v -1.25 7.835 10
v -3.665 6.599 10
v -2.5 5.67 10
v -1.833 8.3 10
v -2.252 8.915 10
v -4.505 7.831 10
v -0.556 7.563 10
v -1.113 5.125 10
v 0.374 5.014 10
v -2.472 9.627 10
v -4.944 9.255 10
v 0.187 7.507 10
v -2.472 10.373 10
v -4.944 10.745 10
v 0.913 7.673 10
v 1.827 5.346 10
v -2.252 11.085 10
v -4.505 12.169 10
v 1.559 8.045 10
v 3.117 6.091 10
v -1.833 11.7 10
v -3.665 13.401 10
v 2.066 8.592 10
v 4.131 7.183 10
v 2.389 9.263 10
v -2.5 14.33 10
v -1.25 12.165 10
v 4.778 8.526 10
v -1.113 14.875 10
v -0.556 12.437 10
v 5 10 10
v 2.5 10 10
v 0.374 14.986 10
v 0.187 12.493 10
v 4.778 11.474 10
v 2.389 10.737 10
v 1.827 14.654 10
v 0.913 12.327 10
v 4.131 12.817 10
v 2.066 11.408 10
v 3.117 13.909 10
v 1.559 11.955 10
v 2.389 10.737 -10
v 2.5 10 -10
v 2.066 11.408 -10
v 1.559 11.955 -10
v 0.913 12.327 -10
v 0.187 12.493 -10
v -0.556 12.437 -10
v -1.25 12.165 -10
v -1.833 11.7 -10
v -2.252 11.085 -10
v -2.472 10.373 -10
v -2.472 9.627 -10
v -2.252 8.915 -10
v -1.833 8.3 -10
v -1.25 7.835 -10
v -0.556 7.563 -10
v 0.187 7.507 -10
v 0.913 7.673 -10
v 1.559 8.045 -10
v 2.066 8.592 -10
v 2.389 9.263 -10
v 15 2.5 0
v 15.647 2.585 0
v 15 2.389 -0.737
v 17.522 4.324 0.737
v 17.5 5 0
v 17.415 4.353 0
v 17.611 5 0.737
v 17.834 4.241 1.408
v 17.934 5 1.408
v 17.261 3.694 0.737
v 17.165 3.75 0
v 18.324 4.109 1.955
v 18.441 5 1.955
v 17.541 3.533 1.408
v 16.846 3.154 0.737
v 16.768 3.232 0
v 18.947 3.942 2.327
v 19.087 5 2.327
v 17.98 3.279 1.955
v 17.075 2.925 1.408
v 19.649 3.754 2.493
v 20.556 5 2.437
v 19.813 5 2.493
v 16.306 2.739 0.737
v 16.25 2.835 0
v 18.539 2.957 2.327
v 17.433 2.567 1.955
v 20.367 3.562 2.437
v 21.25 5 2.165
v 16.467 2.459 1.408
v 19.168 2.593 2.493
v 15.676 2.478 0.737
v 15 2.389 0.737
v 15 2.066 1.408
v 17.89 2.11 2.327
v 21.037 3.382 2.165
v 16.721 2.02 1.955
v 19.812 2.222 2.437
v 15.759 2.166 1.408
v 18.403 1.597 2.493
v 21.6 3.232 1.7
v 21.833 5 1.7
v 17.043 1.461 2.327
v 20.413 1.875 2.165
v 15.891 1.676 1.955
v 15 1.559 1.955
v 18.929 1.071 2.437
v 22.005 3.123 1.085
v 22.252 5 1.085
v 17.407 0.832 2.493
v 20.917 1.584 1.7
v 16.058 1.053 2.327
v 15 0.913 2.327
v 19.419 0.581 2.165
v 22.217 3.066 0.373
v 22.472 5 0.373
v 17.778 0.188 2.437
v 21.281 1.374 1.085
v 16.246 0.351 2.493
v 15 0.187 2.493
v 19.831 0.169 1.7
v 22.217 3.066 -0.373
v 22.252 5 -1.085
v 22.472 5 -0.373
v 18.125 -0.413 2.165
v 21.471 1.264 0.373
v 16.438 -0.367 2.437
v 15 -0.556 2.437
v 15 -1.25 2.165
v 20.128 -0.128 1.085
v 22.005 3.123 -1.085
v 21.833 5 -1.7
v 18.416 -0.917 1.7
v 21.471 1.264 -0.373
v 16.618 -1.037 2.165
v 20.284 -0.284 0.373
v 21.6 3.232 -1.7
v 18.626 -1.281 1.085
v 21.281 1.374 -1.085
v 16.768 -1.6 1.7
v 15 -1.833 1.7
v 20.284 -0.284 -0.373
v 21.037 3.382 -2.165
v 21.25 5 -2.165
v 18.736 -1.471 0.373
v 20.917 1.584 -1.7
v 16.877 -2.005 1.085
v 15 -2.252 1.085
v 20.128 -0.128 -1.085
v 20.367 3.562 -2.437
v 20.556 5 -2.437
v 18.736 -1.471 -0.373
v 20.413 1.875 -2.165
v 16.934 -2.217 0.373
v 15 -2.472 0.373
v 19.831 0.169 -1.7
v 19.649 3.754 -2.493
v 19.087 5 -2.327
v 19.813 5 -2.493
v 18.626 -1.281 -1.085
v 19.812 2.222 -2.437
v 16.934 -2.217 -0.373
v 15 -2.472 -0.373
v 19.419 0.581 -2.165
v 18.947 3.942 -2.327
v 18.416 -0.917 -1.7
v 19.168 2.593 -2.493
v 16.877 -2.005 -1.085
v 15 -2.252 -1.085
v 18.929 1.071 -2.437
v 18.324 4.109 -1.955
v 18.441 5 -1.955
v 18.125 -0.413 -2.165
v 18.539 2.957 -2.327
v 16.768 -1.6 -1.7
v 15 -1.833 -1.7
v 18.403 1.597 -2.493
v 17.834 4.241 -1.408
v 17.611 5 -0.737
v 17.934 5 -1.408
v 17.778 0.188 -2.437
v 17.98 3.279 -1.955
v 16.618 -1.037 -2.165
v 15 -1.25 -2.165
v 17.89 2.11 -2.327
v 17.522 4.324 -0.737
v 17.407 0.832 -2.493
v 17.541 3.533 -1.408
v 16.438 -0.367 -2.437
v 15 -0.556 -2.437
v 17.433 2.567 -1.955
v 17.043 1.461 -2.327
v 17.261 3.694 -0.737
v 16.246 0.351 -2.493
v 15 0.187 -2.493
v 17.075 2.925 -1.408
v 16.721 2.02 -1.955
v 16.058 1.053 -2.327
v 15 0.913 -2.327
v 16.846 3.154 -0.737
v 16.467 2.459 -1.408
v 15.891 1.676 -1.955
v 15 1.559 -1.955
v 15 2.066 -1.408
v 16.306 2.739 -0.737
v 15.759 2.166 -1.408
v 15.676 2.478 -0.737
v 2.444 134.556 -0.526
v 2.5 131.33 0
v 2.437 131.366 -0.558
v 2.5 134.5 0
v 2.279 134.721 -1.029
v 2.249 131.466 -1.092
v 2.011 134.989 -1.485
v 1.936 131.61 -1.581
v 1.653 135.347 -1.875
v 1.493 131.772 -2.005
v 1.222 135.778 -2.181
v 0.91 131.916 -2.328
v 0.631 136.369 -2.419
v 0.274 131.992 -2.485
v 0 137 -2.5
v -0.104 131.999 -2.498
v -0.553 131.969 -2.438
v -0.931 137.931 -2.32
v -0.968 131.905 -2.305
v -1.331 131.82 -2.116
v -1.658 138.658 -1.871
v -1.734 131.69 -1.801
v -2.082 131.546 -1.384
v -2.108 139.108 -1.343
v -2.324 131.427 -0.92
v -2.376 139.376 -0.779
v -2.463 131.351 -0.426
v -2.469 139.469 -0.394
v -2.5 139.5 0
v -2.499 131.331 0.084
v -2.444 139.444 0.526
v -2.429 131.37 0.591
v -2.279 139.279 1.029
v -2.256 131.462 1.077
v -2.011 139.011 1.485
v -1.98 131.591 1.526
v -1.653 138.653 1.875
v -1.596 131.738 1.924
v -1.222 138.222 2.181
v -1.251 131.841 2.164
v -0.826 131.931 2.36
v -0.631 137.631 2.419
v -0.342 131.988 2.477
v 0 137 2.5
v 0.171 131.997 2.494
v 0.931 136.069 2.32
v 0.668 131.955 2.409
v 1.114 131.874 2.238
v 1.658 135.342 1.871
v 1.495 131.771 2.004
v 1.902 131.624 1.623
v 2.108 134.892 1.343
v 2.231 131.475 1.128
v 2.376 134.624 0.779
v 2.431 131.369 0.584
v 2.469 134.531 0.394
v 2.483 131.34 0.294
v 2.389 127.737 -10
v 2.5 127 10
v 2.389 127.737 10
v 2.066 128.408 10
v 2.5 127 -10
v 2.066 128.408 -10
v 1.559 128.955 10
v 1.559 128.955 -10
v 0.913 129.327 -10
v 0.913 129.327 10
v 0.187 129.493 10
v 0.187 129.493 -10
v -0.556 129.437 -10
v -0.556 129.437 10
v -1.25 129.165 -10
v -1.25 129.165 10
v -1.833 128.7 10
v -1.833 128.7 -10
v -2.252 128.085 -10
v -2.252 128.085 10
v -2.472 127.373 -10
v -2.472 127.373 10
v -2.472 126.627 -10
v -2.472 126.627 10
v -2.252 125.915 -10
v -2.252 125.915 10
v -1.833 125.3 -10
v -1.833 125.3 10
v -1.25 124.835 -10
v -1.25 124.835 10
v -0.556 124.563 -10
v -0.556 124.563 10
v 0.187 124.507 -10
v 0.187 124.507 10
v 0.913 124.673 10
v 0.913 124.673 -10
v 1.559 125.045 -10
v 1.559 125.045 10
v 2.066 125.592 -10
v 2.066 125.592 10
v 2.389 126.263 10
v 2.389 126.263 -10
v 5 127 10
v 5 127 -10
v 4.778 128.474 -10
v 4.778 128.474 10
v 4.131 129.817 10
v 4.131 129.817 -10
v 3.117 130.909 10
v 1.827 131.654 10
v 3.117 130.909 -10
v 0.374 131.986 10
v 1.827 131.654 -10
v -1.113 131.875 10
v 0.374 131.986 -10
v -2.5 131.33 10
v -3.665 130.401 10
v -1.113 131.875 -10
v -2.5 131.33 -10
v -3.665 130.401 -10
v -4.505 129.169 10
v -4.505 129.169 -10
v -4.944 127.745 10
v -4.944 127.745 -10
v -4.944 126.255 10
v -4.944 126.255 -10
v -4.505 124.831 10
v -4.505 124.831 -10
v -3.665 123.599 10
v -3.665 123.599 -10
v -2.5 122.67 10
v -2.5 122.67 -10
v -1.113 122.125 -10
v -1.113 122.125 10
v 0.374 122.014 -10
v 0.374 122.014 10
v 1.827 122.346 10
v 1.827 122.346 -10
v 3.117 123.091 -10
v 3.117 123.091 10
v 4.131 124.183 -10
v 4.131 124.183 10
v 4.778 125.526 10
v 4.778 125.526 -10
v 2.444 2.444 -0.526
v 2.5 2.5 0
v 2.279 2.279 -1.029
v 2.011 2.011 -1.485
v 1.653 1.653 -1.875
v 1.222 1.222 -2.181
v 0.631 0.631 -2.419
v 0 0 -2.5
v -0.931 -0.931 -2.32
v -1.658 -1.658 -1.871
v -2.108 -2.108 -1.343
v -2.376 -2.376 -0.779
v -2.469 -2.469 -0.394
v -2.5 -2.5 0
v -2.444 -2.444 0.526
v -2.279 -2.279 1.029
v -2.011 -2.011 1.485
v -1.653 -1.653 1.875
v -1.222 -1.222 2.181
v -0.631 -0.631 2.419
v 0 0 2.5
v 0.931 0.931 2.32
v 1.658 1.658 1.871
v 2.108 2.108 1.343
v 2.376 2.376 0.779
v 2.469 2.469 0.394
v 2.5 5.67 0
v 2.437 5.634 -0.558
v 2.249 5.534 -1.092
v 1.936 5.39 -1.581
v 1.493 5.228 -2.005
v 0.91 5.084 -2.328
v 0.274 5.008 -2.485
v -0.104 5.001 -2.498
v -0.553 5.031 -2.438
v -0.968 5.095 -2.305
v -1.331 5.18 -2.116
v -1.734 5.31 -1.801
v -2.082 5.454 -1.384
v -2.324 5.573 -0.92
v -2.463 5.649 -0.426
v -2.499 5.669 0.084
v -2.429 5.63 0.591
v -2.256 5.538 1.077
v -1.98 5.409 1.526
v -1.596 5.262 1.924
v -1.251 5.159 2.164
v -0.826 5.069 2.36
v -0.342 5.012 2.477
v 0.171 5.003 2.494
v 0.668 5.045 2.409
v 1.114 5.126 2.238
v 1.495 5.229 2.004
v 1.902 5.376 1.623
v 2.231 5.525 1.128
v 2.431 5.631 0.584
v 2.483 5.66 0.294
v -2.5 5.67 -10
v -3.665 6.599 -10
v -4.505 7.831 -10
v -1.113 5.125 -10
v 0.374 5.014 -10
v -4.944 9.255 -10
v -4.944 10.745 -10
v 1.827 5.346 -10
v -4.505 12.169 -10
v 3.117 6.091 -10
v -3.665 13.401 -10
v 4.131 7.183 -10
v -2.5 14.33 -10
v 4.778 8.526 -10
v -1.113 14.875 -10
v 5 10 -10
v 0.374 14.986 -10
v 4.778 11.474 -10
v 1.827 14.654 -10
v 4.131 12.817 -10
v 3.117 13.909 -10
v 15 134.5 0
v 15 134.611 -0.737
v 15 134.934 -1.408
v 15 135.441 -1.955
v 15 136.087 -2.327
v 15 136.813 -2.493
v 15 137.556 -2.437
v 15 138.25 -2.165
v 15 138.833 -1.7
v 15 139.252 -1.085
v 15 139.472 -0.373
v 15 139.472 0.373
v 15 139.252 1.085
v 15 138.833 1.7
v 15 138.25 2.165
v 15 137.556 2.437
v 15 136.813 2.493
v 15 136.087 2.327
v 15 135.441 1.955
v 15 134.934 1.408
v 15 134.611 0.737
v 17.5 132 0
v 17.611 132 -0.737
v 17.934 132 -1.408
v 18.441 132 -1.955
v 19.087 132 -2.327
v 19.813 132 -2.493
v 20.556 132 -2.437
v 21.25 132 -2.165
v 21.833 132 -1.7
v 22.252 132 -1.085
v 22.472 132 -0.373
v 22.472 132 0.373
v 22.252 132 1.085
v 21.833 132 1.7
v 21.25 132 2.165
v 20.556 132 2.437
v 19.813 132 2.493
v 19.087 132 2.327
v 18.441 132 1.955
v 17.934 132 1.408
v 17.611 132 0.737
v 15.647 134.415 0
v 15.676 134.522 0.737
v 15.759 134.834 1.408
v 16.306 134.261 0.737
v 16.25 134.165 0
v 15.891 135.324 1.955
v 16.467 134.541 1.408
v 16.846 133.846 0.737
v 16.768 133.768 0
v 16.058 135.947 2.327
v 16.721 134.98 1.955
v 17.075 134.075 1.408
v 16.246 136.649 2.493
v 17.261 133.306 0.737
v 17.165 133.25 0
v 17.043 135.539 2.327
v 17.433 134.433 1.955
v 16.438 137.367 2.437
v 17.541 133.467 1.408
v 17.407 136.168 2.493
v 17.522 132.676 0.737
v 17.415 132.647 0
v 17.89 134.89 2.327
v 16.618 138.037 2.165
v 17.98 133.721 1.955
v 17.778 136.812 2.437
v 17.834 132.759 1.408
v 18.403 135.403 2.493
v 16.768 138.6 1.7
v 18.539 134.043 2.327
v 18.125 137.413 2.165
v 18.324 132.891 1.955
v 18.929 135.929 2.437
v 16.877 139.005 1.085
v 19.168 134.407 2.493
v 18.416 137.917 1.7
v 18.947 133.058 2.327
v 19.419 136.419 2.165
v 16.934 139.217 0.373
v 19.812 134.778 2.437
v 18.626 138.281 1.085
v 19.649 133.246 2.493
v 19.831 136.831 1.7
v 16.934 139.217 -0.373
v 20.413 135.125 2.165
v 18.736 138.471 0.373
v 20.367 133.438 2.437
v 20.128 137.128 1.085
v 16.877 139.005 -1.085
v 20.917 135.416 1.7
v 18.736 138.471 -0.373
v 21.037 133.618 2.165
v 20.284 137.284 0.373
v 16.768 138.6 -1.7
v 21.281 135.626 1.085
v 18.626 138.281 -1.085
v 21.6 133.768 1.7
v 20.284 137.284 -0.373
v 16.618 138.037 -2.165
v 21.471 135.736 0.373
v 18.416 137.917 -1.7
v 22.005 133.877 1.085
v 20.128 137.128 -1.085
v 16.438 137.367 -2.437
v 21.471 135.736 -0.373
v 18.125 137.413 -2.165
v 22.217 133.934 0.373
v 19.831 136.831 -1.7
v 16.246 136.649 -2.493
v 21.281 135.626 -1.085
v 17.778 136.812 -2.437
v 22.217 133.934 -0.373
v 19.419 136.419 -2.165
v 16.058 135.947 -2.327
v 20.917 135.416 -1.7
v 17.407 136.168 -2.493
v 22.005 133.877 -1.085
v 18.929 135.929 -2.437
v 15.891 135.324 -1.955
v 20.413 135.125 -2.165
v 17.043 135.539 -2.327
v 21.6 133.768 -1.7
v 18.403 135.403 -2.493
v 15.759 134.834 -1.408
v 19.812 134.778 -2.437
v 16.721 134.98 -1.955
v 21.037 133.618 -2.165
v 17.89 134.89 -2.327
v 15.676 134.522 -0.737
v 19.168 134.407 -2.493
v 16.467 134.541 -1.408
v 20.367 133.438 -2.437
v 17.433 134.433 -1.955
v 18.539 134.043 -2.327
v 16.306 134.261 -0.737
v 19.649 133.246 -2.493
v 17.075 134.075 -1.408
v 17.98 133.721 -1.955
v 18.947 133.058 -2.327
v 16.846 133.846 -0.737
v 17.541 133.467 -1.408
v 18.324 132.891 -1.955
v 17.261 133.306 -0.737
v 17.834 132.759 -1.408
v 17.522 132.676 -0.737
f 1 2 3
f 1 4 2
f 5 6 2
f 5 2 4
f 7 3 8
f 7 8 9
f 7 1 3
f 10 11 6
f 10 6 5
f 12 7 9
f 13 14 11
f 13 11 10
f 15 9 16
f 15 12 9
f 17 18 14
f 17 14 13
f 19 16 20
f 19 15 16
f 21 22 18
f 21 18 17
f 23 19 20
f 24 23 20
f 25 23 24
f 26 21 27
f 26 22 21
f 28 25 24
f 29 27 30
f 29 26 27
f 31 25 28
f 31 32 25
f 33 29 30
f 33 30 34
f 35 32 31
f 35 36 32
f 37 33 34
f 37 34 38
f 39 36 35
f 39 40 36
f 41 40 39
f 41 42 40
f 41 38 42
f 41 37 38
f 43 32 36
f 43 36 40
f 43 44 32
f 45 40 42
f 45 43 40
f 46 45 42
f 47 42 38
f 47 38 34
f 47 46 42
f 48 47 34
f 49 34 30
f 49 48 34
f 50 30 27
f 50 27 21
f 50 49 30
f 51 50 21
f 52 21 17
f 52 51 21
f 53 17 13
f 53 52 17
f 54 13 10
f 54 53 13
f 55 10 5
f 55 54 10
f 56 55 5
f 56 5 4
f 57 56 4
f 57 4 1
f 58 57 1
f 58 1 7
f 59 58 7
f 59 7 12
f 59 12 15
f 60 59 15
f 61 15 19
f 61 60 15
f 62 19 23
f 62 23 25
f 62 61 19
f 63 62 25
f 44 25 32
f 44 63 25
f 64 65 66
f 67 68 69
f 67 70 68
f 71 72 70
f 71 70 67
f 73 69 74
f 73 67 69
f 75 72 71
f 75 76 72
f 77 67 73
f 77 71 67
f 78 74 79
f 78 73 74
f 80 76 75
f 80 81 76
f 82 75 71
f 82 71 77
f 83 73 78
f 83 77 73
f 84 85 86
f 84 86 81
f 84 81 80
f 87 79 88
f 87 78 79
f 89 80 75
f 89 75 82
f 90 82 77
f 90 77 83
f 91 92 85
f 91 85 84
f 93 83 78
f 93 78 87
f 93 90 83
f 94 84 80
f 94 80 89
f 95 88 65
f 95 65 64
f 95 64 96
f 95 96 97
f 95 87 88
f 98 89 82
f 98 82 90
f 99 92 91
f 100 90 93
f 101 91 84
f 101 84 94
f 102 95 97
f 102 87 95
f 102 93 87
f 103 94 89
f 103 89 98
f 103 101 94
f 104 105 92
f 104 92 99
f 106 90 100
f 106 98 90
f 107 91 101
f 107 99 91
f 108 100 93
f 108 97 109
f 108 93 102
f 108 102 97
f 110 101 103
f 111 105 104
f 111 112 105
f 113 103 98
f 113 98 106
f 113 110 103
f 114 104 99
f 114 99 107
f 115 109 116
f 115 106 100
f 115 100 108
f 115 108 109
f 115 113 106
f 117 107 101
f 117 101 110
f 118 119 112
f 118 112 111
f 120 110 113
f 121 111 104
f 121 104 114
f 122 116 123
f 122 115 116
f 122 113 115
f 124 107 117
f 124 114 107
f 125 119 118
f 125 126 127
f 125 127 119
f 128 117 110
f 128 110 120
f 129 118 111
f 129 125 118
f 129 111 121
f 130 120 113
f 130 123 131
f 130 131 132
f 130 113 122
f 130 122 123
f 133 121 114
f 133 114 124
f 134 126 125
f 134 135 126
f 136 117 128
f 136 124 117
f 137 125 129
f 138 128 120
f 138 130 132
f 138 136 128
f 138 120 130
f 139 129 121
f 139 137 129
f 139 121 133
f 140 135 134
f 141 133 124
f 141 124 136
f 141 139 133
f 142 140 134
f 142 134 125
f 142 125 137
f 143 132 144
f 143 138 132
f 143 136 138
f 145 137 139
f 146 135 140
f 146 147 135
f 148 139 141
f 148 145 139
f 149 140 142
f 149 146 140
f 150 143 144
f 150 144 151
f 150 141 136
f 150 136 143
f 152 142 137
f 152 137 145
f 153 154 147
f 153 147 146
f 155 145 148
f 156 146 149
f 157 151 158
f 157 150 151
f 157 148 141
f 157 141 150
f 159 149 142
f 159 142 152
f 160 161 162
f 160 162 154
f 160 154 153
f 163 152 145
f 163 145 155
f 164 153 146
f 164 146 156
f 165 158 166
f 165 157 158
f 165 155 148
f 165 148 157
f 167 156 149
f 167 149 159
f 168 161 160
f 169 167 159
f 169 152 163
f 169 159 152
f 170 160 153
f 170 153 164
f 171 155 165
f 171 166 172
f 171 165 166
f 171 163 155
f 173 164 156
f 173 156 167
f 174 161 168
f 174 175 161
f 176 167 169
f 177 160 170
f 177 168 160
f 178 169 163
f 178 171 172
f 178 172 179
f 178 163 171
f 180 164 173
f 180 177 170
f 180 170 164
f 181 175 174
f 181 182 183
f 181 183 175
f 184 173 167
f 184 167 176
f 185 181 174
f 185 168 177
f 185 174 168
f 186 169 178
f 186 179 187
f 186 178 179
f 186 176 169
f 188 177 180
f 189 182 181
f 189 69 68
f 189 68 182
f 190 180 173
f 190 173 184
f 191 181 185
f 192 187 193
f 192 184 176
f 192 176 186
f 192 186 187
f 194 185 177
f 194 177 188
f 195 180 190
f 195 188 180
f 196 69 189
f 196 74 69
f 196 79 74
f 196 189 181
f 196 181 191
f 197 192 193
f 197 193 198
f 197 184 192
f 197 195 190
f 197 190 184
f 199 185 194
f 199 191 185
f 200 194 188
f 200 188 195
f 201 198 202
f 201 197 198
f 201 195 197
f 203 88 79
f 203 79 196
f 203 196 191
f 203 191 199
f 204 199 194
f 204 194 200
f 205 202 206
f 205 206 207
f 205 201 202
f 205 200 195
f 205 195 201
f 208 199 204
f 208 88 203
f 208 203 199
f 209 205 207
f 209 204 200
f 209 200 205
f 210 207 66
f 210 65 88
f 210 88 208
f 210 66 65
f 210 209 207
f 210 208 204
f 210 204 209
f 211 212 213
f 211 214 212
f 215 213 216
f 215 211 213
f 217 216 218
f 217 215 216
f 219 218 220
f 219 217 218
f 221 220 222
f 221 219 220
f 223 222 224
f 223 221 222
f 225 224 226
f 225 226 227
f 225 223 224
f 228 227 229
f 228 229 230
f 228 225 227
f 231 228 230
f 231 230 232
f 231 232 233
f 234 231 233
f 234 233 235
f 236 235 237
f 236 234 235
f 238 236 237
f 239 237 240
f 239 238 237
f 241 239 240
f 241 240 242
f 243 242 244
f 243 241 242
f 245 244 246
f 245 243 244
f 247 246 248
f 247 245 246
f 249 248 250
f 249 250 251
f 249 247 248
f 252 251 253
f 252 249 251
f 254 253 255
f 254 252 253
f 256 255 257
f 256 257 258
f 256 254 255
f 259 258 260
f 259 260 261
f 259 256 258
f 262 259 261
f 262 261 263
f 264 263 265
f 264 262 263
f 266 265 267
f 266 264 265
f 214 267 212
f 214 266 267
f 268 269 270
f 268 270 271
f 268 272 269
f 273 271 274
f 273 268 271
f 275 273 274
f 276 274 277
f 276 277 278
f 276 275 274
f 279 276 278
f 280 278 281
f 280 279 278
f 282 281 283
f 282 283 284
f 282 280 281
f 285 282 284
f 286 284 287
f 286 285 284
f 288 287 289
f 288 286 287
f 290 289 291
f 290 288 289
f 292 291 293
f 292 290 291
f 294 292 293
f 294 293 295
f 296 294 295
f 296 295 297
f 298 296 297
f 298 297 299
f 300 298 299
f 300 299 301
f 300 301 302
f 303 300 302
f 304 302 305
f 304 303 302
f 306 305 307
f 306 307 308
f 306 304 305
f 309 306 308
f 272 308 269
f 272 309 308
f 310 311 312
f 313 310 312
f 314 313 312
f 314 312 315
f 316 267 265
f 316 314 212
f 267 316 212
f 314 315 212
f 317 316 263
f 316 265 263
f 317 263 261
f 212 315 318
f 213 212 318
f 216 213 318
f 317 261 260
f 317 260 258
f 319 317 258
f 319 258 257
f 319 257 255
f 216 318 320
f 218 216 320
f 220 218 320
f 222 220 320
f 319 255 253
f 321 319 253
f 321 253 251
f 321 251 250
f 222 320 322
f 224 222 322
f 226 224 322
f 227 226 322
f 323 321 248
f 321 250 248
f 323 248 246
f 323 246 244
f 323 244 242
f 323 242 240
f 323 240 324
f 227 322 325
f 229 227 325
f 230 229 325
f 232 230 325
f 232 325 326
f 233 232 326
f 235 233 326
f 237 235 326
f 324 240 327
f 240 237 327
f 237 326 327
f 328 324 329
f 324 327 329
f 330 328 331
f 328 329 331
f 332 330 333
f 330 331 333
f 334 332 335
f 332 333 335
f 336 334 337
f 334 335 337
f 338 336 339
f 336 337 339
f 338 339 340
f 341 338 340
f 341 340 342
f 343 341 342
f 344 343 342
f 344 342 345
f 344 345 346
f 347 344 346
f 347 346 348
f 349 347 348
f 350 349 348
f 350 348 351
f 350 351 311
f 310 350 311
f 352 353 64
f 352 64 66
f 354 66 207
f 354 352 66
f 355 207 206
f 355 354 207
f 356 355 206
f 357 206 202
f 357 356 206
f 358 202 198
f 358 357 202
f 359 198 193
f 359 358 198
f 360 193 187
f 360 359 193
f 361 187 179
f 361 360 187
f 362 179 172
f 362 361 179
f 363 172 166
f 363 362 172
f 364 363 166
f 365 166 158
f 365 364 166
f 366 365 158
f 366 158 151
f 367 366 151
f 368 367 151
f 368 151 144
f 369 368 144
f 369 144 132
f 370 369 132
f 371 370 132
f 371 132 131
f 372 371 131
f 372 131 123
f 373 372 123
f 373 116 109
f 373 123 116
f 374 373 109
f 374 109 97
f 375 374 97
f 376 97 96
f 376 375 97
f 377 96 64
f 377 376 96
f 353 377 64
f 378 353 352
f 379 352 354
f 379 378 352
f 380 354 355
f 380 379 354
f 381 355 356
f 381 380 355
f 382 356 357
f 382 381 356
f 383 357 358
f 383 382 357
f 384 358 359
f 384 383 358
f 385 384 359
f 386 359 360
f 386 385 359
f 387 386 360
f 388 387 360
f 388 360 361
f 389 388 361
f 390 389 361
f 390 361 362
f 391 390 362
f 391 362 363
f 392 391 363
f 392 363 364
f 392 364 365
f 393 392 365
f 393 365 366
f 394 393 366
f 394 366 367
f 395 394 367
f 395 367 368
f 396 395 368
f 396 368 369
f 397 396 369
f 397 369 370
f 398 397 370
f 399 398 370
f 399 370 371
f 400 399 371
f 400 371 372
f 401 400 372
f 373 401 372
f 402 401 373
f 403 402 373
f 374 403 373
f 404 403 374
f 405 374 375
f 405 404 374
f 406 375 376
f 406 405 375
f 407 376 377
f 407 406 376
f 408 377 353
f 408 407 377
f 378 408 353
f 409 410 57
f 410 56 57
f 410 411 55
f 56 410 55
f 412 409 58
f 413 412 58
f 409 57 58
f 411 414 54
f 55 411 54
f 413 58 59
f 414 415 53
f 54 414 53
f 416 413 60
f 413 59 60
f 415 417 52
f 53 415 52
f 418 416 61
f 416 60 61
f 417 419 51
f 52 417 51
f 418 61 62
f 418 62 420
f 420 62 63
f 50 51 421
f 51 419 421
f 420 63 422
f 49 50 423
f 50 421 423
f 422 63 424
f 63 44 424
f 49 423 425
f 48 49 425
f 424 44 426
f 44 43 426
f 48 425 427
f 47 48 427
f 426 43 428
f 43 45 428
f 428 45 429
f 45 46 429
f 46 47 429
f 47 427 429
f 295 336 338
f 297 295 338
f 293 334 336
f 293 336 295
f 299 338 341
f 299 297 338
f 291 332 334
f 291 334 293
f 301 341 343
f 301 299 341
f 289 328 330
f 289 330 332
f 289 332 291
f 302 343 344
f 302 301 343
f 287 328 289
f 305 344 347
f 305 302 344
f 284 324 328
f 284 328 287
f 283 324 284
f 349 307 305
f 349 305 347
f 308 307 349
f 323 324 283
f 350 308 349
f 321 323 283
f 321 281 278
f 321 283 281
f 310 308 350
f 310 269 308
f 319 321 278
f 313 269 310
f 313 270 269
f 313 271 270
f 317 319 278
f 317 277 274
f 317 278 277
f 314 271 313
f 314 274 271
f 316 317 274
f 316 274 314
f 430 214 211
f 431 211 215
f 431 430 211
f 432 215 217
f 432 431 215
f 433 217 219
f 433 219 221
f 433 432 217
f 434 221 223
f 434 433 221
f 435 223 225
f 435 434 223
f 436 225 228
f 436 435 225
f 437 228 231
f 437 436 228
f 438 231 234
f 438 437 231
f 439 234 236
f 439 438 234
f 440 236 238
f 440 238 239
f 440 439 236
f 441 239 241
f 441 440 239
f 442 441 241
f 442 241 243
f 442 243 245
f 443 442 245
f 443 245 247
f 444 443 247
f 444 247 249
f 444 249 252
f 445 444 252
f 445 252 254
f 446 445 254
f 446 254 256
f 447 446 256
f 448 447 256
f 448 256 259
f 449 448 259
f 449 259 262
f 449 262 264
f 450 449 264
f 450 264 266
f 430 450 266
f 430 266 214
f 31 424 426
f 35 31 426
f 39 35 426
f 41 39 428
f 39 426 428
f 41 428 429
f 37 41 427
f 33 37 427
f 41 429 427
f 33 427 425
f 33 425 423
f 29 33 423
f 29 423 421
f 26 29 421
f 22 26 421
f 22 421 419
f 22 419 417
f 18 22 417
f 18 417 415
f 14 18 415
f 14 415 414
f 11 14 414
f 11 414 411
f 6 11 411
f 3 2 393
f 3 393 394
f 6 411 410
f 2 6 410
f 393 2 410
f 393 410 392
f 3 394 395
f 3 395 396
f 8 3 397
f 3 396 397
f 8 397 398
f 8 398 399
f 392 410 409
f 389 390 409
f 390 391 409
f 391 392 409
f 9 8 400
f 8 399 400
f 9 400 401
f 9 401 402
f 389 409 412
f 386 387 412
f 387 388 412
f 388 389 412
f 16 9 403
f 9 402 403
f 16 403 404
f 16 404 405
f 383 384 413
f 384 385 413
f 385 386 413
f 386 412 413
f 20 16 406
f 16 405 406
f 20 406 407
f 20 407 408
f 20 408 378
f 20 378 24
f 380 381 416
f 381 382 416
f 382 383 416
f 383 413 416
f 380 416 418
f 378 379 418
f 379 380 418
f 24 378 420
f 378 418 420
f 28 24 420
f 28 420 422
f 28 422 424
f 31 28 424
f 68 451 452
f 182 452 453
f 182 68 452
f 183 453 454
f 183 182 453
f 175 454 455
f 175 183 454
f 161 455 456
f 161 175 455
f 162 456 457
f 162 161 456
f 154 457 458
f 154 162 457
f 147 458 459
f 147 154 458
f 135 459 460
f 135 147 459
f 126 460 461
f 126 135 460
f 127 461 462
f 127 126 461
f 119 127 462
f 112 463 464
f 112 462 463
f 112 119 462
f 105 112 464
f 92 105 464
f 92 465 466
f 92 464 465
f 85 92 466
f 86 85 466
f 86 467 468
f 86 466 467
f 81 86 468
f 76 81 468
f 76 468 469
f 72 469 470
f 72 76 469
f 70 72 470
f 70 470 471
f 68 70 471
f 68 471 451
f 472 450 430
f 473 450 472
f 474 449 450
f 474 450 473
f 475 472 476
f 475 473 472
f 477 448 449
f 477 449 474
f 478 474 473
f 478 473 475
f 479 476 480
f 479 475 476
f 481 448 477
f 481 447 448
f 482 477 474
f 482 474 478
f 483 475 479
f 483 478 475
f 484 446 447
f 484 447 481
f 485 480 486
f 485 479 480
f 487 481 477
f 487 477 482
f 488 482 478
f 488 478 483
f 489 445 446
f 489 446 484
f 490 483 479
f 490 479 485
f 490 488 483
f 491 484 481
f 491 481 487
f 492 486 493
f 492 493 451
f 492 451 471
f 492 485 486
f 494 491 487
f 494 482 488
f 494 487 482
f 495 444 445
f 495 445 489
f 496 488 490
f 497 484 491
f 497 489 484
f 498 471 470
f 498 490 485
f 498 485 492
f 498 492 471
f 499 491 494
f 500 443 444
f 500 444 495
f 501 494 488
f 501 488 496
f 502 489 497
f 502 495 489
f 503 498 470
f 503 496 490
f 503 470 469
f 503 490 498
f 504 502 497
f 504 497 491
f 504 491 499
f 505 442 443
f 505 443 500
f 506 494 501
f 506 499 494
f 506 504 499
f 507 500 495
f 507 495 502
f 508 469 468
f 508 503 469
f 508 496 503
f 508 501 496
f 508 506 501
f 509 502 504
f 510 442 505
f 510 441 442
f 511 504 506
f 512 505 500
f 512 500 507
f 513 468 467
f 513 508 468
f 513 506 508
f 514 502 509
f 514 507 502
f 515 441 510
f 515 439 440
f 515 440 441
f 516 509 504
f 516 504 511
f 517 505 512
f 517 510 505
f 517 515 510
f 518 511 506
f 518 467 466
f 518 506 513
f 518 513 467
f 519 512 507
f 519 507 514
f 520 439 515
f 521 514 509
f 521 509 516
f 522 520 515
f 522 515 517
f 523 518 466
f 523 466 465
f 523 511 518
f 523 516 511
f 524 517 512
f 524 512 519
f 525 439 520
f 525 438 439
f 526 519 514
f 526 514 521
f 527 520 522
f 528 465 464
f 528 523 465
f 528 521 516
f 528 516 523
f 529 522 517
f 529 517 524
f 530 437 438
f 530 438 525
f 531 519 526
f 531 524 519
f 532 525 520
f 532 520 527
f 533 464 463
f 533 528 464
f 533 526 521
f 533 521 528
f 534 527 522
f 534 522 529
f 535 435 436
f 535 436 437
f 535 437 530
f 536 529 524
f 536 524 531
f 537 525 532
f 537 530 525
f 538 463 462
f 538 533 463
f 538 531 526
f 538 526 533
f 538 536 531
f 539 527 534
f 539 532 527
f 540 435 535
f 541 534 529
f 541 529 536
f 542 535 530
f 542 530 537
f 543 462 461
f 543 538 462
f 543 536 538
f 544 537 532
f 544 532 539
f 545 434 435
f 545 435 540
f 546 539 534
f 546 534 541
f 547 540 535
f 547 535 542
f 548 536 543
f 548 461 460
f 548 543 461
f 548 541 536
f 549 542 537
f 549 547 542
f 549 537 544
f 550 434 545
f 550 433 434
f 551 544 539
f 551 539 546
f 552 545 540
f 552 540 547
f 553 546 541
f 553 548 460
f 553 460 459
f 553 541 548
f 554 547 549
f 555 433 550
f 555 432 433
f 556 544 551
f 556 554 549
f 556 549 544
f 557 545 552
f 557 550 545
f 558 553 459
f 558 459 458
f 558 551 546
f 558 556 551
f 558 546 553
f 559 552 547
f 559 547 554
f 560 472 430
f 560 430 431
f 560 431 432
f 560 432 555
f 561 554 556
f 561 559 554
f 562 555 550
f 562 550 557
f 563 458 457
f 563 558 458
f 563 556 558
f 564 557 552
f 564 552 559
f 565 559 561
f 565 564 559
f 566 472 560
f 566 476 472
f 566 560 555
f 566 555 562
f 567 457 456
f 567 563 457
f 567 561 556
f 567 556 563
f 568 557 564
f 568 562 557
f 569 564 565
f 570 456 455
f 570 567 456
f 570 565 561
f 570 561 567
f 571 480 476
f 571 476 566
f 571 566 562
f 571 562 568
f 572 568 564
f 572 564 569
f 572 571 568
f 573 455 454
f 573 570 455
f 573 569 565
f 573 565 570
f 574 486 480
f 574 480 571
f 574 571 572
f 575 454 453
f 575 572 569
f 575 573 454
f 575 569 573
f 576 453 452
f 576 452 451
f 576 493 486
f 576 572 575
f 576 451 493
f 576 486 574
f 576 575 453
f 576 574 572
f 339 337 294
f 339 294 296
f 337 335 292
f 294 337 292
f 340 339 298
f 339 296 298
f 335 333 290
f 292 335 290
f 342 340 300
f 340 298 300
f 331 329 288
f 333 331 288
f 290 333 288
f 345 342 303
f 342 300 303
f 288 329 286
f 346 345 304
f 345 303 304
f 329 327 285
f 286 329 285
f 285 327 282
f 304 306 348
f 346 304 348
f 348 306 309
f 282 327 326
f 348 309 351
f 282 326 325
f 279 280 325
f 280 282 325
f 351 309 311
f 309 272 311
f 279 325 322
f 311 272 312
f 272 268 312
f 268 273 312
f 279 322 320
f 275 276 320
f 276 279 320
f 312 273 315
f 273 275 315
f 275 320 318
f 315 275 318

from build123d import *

# Parameters (mm, degrees)
ESQUISSE2_R             = 2.5
BOSS_EXTRU_1_DEPTH      = 10
BOSS_EXTRU_1_DEPTH_BACK = 10
ESQUISSE3_R             = 5
ESQUISSE3_R_2           = 2.5
ESQUISSE5_R             = 2.5
ENL_V_MAT_EXTRU_1_DEPTH = 143.711247056


with BuildPart() as part:
    # Balayage1: sweep along a path in Esquisse1
    with BuildLine(Plane.XY) as balayage1_path:
        Line((0, 127), (0, 137))
        Line((0, 137), (15, 137))
        ThreePointArc((15, 137), (18.535533906, 135.535533906), (20, 132))
        Line((20, 132), (20, 5))
        ThreePointArc((20, 5), (18.535533906, 1.464466094), (15, 0))
        Line((15, 0), (0, 0))
        Line((0, 0), (0, 10))
    # Esquisse2 → Balayage1 (sweep)
    with BuildSketch(Plane(origin=(0, 127, 0), x_dir=(1, 0, 0), z_dir=(0, 1, 0))):
        Circle(ESQUISSE2_R)
    sweep(path=balayage1_path.line, transition=Transition.RIGHT)

    # Esquisse3 → Boss.-Extru.1 (add, two sides: drawn at the far end of the back side and taken through both)
    # profile 1 of 2: a face of its own
    with BuildSketch(Plane.XY.offset(-BOSS_EXTRU_1_DEPTH_BACK)):
        with Locations((0, 127)):
            Circle(ESQUISSE3_R)
        with Locations((0, 127)):
            Circle(ESQUISSE3_R_2, mode=Mode.SUBTRACT)
    # profile 2 of 2: a face of its own
    with BuildSketch(Plane.XY.offset(-BOSS_EXTRU_1_DEPTH_BACK)):
        with Locations((0, 10)):
            Circle(ESQUISSE3_R)
        with Locations((0, 10)):
            Circle(ESQUISSE3_R_2, mode=Mode.SUBTRACT)
    extrude(amount=BOSS_EXTRU_1_DEPTH + BOSS_EXTRU_1_DEPTH_BACK)

    # Esquisse5 → Enlèv. mat.-Extru.1 (cut, through all)
    with BuildSketch(Plane.XY.offset(10)):
        with Locations((0, 127)):
            Circle(ESQUISSE5_R)
        with Locations((0, 10)):
            Circle(ESQUISSE5_R)
    extrude(amount=-ENL_V_MAT_EXTRU_1_DEPTH, mode=Mode.SUBTRACT)


solid = part.part
